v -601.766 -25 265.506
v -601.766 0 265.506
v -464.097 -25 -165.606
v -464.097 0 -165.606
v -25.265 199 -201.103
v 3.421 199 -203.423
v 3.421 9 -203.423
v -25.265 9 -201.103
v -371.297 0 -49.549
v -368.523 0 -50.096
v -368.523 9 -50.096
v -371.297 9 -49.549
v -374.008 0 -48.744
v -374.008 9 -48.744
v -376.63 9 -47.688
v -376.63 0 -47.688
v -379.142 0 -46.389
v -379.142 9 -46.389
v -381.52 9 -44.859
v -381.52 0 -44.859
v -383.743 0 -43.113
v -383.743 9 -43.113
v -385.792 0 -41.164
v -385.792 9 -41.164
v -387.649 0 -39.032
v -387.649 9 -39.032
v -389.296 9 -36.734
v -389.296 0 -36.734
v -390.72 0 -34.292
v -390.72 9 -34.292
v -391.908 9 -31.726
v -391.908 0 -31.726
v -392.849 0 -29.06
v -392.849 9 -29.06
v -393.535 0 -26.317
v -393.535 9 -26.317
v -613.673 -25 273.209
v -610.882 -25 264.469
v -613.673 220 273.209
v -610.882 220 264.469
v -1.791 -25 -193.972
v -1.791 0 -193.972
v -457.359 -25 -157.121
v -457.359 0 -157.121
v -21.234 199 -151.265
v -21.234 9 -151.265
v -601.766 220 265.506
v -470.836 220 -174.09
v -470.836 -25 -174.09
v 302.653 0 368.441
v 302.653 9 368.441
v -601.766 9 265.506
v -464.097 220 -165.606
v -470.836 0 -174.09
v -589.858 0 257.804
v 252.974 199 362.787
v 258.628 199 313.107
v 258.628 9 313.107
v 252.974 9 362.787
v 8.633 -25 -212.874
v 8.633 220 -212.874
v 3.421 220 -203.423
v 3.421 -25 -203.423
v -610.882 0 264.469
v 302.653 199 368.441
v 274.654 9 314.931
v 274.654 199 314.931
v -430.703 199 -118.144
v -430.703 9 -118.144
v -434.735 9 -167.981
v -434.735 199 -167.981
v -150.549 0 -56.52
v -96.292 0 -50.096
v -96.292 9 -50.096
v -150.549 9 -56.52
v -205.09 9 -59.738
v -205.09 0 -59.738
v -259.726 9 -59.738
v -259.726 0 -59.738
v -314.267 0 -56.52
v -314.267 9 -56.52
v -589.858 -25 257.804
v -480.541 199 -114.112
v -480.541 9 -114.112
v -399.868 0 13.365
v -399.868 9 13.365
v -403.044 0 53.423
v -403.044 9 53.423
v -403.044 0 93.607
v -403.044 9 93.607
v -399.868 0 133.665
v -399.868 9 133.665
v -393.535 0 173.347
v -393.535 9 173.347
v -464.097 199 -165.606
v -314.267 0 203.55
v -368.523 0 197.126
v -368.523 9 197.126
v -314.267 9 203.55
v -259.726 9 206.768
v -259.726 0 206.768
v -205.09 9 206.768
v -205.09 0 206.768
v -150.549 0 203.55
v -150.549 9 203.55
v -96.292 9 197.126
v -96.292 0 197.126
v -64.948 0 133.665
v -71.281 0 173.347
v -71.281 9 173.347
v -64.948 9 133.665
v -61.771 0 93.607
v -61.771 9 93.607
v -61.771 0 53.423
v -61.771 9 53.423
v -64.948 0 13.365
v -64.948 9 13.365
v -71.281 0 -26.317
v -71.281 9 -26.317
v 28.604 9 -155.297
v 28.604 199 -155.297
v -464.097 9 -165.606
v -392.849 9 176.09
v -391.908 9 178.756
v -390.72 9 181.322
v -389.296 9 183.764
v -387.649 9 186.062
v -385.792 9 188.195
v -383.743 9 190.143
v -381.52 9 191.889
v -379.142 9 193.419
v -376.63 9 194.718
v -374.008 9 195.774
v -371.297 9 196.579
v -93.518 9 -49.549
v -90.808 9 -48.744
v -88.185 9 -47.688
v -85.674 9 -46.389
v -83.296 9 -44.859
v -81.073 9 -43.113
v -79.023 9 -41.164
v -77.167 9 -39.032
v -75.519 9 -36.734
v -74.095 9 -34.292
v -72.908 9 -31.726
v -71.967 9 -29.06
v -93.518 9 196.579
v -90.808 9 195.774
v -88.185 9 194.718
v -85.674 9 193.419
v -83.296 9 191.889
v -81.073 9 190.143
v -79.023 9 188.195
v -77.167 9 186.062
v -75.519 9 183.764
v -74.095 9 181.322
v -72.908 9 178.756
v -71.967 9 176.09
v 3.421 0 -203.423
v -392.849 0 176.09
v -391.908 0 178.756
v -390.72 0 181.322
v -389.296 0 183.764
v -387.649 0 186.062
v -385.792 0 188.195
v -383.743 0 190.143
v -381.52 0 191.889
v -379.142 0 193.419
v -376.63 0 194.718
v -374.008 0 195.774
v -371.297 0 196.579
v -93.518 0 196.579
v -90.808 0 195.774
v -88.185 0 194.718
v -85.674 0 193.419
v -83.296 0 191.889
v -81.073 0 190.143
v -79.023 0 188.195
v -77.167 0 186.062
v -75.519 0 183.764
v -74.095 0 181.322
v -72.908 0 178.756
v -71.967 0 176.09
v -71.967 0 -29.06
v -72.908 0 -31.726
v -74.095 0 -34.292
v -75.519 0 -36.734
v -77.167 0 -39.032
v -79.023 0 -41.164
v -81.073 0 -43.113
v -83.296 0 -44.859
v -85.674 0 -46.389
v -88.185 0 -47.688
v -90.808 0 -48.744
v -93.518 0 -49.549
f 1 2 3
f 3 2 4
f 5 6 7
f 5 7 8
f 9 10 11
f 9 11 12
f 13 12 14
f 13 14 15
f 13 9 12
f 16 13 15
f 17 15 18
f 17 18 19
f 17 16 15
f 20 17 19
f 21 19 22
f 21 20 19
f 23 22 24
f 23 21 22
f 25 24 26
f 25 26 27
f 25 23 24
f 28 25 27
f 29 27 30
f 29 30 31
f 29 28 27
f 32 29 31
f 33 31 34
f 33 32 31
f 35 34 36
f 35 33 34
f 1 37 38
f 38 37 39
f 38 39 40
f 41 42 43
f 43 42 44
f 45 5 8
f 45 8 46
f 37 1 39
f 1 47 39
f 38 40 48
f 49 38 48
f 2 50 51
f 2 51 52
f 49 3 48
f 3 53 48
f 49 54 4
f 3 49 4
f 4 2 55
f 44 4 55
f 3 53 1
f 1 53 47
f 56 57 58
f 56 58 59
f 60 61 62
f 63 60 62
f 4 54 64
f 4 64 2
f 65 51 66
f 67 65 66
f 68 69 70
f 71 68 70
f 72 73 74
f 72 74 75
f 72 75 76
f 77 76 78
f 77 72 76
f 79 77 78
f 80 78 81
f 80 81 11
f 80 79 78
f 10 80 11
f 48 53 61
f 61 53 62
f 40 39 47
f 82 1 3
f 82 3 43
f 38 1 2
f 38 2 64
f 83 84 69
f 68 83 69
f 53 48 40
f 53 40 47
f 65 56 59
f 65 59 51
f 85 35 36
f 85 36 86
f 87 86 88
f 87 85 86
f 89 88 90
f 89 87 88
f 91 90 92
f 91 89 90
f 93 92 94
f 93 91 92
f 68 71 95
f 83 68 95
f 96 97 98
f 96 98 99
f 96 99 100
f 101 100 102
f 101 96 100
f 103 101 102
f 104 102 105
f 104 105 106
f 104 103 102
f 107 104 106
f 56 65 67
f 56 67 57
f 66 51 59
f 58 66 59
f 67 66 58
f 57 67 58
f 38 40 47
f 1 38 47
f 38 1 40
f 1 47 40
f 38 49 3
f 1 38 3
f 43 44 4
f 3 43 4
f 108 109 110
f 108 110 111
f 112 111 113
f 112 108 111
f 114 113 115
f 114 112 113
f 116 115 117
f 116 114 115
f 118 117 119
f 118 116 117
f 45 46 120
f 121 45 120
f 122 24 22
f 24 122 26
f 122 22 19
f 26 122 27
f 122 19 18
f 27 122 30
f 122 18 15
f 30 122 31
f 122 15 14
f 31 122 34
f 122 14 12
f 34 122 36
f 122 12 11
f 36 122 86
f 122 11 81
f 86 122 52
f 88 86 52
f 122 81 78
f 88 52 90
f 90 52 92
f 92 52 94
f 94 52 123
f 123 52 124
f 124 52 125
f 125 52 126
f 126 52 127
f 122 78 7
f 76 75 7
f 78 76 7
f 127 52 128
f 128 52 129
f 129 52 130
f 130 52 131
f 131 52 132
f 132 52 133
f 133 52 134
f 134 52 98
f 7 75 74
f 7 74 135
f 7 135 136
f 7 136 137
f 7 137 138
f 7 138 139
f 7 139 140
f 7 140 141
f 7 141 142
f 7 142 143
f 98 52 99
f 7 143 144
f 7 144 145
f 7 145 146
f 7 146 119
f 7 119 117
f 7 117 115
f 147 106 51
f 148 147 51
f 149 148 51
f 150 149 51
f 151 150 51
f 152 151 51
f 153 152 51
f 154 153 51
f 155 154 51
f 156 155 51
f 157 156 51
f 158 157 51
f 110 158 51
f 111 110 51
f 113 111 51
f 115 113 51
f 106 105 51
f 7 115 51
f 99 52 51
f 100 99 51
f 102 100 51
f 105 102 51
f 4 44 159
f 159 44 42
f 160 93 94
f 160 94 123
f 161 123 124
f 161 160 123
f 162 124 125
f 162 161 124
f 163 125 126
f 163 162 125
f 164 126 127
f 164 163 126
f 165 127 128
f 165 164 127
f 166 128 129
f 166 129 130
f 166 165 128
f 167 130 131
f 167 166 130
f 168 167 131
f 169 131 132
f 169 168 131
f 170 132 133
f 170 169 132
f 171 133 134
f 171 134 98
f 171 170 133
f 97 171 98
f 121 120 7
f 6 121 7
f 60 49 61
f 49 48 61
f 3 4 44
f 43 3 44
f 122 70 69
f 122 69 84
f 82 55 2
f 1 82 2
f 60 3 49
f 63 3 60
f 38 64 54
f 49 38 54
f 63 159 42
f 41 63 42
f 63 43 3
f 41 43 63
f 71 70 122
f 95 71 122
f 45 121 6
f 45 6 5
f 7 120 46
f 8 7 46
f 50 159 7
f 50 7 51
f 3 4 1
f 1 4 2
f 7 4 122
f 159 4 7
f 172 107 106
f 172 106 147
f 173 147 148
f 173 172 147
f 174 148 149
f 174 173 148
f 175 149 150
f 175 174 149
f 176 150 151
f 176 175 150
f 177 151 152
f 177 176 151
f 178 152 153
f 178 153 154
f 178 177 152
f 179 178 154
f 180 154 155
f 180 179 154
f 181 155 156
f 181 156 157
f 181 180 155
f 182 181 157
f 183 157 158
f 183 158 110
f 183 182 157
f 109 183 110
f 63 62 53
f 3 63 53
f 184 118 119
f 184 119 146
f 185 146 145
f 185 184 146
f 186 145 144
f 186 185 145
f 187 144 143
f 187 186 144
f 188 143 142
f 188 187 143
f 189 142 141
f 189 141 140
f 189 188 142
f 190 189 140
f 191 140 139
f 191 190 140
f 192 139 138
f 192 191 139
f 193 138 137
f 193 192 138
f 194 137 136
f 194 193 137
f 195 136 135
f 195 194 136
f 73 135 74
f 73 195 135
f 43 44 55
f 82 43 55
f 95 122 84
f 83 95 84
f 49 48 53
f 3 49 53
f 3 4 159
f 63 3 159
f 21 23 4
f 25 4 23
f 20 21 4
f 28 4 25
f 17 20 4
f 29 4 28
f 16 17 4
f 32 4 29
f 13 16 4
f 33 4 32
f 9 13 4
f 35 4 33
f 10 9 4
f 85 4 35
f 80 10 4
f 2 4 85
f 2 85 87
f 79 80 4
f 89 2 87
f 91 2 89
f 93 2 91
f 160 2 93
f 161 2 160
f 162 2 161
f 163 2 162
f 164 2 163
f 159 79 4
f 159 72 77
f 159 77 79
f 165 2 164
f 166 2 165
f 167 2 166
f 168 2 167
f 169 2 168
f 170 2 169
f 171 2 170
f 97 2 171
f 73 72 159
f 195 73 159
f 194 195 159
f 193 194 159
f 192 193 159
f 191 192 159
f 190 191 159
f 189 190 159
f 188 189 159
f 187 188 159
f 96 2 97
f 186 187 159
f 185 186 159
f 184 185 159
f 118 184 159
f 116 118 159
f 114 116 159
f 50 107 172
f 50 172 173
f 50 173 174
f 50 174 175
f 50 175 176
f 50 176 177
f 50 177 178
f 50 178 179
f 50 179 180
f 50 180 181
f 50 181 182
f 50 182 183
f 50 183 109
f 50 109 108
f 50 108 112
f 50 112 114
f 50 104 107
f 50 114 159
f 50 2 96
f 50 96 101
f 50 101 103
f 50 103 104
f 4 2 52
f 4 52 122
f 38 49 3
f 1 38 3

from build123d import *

# Parameters (mm, degrees)
F2_DEPTH      = 9
F4_DEPTH      = 220
F4_DEPTH_BACK = 25
F5_DEPTH      = 220
F5_DEPTH_BACK = 25
F6_DEPTH      = 25
F7_DEPTH      = 25
F10_DEPTH     = 190


with BuildPart() as f2:
    # F1 (on Front) → F2 (new body)
    with BuildSketch(Plane.XZ):
        Polygon((-601.7657060729, 265.5064328389), (-464.0971021196, -165.605785879), (3.4211622742, -203.4229150402), (302.6529489276, 368.4408506737), align=None)
        with BuildLine():
            ThreePointArc((-71.2809765609, 173.3468978927), (-61.3738975589, 73.5150277615), (-71.2809765609, -26.3168423698))
            ThreePointArc((-71.2809765609, -26.3168423698), (-80.0250330385, -42.1627116629), (-96.2921216197, -50.0956762051))
            ThreePointArc((-96.2921216197, -50.0956762051), (-232.4077486992, -60.1403568485), (-368.5233757787, -50.0956762051))
            ThreePointArc((-368.5233757787, -50.0956762051), (-384.7904643599, -42.1627116629), (-393.5345208375, -26.3168423698))
            ThreePointArc((-393.5345208375, -26.3168423698), (-403.4415998395, 73.5150277615), (-393.5345208375, 173.3468978927))
            ThreePointArc((-393.5345208375, 173.3468978927), (-384.7904643599, 189.1927671858), (-368.5233757787, 197.125731728))
            ThreePointArc((-368.5233757787, 197.125731728), (-232.4077486992, 207.1704123714), (-96.2921216197, 197.125731728))
            ThreePointArc((-96.2921216197, 197.125731728), (-80.0250330385, 189.1927671858), (-71.2809765609, 173.3468978927))
        make_face(mode=Mode.SUBTRACT)
    extrude(amount=-F2_DEPTH)


with BuildPart() as f4:
    # F3 (on Front) → F4 (new body, two sides)
    with BuildSketch(Plane.XZ) as f4_sk:
        Polygon((3.4211622742, -203.4229150402), (-464.0971021196, -165.605785879), (-470.8355153758, -174.0901174304), (8.6334902122, -212.8739312278), align=None)
    extrude(amount=-F4_DEPTH)
    extrude(f4_sk.sketch, amount=F4_DEPTH_BACK)


with BuildPart() as f4b:
    # F3 (on Front) → F4, piece 2 (new body, two sides)
    with BuildSketch(Plane.XZ) as f4_2_sk:
        Polygon((-610.8821219424, 264.4688680396), (-601.7657060729, 265.5064328389), (-613.6732371829, 273.2093059424), align=None)
    extrude(amount=-F4_DEPTH)
    extrude(f4_2_sk.sketch, amount=F4_DEPTH_BACK)


with BuildPart() as f5:
    # F3 (on Front) → F5 (new body, two sides)
    with BuildSketch(Plane.XZ) as f5_sk:
        Polygon((-470.8355153758, -174.0901174304), (-464.0971021196, -165.605785879), (-601.7657060729, 265.5064328389), (-610.8821219424, 264.4688680396), align=None)
    extrude(amount=-F5_DEPTH)
    extrude(f5_sk.sketch, amount=F5_DEPTH_BACK)


with BuildPart() as f6:
    # F3 (on Front) → F6 (new body)
    with BuildSketch(Plane.XZ):
        Polygon((-601.7657060729, 265.5064328389), (-464.0971021196, -165.605785879), (-457.3586888634, -157.1214543275), (-589.8581749629, 257.8035597354), align=None)
    extrude(amount=F6_DEPTH)


with BuildPart() as f7:
    # F3 (on Front) → F7 (new body)
    with BuildSketch(Plane.XZ):
        Polygon((-457.3586888634, -157.1214543275), (-464.0971021196, -165.605785879), (3.4211622742, -203.4229150402), (-1.7911656639, -193.9718988526), align=None)
    extrude(amount=F7_DEPTH)


with BuildPart() as f7b:
    # F3 (on Front) → F7, piece 2 (new body)
    with BuildSketch(Plane.XZ):
        Polygon((-470.8355153758, -174.0901174304), (-464.0971021196, -165.605785879), (-601.7657060729, 265.5064328389), (-610.8821219424, 264.4688680396), align=None)
    extrude(amount=F7_DEPTH)


with BuildPart() as f10:
    # F9 (on face) → F10 (new body)
    with BuildSketch(Plane(origin=(0, 9, 0), x_dir=(-1, 0, 0), z_dir=(0, 1, 0))):
        Polygon((-302.6529489276, 368.4408506737), (-274.6537431194, 314.9313908348), (-258.6278079955, 313.1074343152), (-252.9736702823, 362.7867129605), align=None)
    extrude(amount=F10_DEPTH)


with BuildPart() as f10b:
    # F9 (on face) → F10, piece 2 (new body)
    with BuildSketch(Plane(origin=(0, 9, 0), x_dir=(-1, 0, 0), z_dir=(0, 1, 0))):
        Polygon((-28.6036041985, -155.2965905285), (-3.4211622742, -203.4229150402), (25.2649058109, -201.1025249624), (21.2336180232, -151.2653027407), align=None)
    extrude(amount=F10_DEPTH)


with BuildPart() as f10c:
    # F9 (on face) → F10, piece 3 (new body)
    with BuildSketch(Plane(origin=(0, 9, 0), x_dir=(-1, 0, 0), z_dir=(0, 1, 0))):
        Polygon((430.7034560891, -118.1436582337), (434.7347438769, -167.9808804554), (464.0971021196, -165.605785879), (480.5406783108, -114.112370446), align=None)
    extrude(amount=F10_DEPTH)


solid = Compound([f2.part, f4.part, f4b.part, f5.part, f6.part, f7.part, f7b.part, f10.part, f10b.part, f10c.part])
